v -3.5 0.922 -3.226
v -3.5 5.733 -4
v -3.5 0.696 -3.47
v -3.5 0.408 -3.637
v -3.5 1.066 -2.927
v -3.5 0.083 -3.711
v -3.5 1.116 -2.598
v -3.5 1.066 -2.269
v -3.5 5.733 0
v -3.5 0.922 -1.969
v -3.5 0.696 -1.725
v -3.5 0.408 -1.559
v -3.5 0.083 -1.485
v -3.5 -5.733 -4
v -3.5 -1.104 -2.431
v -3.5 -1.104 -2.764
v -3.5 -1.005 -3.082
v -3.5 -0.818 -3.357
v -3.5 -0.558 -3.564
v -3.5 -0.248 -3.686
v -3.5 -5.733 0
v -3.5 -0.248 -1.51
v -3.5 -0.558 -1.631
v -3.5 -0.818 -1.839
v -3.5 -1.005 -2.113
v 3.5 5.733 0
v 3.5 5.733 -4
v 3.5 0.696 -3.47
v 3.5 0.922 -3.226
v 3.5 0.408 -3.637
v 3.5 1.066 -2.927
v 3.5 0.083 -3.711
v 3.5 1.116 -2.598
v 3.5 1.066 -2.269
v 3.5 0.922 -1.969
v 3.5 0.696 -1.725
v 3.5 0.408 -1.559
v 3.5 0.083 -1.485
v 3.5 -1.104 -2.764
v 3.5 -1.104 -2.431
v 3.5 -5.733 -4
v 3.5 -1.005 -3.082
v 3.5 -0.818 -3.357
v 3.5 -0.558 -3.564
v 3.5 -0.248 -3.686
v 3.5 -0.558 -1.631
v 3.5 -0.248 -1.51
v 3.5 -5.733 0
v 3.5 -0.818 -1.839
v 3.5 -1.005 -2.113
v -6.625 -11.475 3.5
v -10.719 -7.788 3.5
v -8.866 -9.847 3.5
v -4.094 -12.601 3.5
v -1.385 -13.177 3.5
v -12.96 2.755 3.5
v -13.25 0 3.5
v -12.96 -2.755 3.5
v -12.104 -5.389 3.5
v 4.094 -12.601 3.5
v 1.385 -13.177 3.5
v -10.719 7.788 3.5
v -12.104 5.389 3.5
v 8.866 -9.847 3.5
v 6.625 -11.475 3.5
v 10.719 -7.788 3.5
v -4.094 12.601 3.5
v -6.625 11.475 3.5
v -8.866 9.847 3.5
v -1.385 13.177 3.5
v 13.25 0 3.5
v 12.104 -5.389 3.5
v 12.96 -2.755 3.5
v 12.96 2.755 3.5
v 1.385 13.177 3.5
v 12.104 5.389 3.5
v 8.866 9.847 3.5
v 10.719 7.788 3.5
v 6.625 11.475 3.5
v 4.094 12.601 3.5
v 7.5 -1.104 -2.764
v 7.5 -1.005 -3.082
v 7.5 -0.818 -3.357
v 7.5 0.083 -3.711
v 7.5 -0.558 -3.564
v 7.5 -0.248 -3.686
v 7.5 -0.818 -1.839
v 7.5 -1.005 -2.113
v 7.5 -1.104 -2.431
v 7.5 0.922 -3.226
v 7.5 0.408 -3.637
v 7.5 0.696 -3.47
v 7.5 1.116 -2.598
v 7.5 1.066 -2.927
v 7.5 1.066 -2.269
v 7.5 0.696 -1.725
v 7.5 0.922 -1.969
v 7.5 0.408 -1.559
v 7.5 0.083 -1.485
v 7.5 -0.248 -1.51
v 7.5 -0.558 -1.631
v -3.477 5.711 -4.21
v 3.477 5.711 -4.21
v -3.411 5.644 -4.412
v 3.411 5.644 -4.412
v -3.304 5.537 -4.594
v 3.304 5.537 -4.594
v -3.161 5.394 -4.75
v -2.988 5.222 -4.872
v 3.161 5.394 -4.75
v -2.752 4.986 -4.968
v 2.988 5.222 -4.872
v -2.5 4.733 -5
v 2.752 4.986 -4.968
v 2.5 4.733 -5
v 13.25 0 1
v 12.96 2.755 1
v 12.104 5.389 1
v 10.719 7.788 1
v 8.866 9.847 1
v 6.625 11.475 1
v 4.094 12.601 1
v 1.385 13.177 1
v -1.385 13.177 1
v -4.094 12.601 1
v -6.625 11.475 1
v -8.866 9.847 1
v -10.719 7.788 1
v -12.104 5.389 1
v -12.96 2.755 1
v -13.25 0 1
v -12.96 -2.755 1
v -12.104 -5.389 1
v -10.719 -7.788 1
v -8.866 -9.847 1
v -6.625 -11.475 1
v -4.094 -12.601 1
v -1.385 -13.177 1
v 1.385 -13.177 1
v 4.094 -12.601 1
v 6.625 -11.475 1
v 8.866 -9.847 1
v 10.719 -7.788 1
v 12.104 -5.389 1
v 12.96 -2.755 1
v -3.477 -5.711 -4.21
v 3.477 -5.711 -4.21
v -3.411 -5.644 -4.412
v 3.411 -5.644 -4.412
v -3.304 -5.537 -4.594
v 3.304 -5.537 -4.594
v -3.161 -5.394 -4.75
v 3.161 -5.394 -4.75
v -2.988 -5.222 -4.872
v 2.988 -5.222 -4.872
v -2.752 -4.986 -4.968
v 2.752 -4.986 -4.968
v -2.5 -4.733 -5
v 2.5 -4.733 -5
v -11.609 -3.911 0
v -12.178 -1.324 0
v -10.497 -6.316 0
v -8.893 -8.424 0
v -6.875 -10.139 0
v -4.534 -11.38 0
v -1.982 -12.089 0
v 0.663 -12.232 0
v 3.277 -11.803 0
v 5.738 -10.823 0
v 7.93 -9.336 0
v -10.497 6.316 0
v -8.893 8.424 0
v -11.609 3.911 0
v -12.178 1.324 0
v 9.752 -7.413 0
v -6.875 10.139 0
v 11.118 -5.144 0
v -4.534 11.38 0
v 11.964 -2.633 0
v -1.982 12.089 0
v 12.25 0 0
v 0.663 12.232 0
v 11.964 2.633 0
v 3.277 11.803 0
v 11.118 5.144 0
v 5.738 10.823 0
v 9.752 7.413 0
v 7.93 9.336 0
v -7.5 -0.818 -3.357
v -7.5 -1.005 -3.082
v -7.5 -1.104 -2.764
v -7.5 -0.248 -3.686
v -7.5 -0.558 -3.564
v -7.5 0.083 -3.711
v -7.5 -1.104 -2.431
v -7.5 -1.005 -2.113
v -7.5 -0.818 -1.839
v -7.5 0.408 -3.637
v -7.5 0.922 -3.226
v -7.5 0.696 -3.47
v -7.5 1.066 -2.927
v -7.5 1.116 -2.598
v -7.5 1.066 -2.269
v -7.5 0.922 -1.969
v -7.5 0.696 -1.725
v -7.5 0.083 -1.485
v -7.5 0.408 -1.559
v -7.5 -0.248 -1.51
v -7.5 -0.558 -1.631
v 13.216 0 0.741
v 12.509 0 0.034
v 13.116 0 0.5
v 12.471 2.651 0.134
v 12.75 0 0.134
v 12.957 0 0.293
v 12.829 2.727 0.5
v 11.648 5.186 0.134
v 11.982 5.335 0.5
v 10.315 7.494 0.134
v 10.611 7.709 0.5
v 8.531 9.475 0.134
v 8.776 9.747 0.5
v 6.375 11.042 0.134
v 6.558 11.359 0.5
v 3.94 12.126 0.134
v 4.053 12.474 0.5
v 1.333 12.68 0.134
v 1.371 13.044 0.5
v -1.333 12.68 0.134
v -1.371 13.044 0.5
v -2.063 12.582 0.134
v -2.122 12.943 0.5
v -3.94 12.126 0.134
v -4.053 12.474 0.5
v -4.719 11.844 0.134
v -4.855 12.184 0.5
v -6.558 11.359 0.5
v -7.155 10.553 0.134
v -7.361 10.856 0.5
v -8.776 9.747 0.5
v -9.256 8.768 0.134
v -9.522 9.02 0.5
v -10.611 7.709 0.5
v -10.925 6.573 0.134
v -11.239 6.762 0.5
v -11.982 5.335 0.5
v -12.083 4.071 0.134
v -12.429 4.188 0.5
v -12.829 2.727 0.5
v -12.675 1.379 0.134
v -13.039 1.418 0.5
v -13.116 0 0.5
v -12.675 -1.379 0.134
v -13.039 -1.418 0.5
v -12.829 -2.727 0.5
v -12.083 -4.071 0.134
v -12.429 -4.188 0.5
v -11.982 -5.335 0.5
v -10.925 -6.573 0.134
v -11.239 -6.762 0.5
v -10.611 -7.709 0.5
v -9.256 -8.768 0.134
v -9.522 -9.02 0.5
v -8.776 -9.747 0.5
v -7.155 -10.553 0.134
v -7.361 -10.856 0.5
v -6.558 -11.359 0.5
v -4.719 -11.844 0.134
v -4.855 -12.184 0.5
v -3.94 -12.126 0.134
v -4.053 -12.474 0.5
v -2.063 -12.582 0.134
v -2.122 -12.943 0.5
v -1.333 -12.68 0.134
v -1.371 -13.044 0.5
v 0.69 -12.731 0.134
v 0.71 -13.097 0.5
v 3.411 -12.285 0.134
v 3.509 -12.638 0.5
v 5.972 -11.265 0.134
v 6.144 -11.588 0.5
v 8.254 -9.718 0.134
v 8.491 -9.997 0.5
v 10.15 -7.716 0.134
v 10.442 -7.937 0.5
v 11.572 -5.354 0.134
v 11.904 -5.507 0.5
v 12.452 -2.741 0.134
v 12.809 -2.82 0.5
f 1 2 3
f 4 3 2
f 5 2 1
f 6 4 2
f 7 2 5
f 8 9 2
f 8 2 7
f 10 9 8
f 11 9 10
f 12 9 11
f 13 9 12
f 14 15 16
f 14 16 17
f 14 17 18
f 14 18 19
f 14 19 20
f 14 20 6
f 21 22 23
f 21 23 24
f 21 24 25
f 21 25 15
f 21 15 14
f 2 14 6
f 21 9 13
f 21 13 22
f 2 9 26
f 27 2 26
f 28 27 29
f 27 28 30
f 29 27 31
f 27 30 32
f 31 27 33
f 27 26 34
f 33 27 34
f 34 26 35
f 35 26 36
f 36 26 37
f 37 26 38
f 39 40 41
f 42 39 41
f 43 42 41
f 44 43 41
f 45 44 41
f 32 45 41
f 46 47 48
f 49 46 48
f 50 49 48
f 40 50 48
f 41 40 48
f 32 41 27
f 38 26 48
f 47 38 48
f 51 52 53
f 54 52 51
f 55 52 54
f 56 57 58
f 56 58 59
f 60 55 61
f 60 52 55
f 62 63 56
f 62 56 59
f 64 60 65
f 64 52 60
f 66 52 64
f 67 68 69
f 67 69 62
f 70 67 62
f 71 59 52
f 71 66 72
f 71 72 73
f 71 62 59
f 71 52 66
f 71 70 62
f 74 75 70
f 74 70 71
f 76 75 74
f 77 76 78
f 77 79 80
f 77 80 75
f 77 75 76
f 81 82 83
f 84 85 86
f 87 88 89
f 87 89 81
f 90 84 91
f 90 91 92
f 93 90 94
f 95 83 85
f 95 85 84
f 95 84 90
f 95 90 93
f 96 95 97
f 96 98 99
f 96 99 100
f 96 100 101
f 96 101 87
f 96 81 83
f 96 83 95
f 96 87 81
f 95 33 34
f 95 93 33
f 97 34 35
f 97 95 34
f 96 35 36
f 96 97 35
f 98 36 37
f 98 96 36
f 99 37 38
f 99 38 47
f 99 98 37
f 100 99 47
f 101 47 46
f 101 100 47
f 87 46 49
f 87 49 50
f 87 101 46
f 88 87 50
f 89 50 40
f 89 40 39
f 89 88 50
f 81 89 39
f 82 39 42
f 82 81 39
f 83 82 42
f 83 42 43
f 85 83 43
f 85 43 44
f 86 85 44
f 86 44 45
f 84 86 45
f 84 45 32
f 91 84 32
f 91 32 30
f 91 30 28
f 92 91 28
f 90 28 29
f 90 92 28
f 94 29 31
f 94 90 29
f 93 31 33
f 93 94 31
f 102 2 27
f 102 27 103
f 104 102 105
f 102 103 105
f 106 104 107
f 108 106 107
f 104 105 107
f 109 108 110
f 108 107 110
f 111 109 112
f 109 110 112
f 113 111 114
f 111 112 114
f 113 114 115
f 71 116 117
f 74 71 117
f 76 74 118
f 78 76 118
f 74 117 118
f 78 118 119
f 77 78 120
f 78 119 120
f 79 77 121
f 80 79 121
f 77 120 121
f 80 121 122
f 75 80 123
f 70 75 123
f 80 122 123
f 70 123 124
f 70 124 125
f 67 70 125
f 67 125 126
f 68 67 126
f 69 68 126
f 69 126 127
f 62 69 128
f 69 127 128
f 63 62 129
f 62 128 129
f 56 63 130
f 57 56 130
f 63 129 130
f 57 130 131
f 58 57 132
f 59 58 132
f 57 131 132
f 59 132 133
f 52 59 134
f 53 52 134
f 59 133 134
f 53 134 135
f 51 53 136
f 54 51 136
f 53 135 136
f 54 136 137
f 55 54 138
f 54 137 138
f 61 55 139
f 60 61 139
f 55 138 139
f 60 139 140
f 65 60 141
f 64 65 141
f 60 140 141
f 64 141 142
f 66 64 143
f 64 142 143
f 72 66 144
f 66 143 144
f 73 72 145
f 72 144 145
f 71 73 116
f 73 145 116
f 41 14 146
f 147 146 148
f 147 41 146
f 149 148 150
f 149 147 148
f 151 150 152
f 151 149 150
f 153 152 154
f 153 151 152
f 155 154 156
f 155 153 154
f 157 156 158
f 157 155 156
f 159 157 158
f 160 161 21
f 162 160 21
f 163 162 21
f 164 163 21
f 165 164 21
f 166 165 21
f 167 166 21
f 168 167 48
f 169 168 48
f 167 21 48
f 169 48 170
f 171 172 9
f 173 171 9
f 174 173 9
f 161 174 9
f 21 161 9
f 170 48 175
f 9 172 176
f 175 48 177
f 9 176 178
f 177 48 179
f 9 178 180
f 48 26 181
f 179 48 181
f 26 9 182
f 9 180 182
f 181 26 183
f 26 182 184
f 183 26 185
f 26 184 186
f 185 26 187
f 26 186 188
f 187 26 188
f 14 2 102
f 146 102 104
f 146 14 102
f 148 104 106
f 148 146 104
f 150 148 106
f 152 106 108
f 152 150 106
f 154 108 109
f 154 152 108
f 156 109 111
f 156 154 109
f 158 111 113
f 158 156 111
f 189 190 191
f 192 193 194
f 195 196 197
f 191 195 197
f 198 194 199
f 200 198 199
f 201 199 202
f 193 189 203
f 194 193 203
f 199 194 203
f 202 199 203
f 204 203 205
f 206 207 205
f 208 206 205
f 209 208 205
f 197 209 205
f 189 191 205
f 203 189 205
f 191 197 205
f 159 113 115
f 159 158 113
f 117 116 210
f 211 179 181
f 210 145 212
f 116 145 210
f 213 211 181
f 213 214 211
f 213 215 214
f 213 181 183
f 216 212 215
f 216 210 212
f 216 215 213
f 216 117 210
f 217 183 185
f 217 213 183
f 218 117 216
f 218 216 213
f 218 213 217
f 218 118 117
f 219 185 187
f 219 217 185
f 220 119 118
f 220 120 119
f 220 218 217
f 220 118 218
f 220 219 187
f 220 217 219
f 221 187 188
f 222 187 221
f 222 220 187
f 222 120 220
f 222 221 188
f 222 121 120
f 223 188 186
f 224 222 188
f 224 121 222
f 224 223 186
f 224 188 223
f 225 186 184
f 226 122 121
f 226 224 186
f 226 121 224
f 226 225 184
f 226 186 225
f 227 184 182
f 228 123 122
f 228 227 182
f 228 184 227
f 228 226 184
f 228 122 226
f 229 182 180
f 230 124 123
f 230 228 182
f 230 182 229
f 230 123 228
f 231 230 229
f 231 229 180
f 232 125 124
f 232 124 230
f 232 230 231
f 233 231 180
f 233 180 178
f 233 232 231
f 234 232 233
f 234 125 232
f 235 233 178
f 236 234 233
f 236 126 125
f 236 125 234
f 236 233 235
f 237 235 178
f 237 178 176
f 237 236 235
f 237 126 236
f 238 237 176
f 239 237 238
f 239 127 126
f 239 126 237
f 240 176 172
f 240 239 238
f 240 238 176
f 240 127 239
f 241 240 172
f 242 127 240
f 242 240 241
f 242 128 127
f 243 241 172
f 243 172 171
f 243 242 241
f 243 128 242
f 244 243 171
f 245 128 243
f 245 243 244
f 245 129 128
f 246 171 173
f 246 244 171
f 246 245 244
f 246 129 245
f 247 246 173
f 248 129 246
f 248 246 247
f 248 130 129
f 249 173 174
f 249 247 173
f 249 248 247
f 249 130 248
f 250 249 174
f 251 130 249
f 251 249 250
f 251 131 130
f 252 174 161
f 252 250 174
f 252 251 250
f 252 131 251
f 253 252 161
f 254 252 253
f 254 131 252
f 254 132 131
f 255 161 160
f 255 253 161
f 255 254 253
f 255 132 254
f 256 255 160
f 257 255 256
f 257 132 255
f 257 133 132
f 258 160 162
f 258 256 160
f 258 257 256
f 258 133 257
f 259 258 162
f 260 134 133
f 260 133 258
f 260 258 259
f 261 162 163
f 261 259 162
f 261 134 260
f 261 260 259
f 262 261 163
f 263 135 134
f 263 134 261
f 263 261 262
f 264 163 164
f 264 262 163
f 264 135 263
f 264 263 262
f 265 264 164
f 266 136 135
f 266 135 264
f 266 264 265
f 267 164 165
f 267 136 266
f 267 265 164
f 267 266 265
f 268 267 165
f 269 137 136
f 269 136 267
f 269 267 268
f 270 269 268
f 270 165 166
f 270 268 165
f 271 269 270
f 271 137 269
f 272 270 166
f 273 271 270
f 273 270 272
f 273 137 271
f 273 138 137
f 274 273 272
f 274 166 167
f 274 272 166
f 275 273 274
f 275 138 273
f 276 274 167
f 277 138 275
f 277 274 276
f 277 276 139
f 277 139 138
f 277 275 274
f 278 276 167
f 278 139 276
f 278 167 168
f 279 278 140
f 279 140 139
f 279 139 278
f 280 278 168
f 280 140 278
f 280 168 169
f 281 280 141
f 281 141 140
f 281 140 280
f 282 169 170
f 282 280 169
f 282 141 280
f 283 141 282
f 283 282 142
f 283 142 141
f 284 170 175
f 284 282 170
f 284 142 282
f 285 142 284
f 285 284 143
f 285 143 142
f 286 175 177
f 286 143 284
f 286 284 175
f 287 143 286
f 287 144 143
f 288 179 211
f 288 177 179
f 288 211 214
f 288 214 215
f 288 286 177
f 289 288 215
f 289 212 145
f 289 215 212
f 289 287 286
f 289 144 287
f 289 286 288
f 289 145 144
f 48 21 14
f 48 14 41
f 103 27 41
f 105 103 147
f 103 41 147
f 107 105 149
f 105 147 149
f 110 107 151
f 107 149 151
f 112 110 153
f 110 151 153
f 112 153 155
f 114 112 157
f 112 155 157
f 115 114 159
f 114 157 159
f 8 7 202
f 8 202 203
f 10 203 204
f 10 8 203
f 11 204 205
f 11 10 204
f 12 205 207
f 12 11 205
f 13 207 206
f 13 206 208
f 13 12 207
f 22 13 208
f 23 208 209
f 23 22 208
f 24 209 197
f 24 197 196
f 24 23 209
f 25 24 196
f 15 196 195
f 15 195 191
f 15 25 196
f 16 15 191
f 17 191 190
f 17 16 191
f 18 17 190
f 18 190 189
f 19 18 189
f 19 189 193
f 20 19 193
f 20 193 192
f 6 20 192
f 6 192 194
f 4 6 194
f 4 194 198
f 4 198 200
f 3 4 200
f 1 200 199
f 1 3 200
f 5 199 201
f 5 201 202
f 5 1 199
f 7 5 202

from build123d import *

# Parameters (mm, degrees)
F0_R     = 13.25
F1_DEPTH = 3.5
F2_W     = 6.9995252416
F2_H     = 11.4660244435
F3_DEPTH = 5
F4_R     = 1.115966898
F5_DEPTH = 7.5
F6_R     = 1
F7_R     = 1


with BuildPart() as f1:
    # F0 (on Top) → F1 (new body)
    with BuildSketch(Plane.XY):
        Circle(F0_R)
    extrude(amount=F1_DEPTH)

    # F2 (on face) → F3 (join)
    with BuildSketch(Plane(origin=(0, 0, 0), x_dir=(1, 0, 0), z_dir=(0, 0, -1))):
        Rectangle(F2_W, F2_H)
    extrude(amount=F3_DEPTH)

    # F4 (on Right) → F5 (join, symmetric)
    with BuildSketch(Plane.YZ):
        with Locations((0, -2.5976826437)):
            Circle(F4_R)
    extrude(amount=F5_DEPTH, both=True)

    # F6
    f6_edges = [f1.edges().sort_by_distance(p)[0] for p in [
        (-13.25, 0, 0),
    ]]
    fillet(f6_edges, radius=F6_R)

    # F7
    f7_edges = [f1.edges().sort_by_distance(p)[0] for p in [
        (0, 5.733012, -5),
        (3.499763, 0, -5),
        (0, -5.733012, -5),
        (-3.499763, 0, -5),
    ]]
    fillet(f7_edges, radius=F7_R)


solid = f1.part
